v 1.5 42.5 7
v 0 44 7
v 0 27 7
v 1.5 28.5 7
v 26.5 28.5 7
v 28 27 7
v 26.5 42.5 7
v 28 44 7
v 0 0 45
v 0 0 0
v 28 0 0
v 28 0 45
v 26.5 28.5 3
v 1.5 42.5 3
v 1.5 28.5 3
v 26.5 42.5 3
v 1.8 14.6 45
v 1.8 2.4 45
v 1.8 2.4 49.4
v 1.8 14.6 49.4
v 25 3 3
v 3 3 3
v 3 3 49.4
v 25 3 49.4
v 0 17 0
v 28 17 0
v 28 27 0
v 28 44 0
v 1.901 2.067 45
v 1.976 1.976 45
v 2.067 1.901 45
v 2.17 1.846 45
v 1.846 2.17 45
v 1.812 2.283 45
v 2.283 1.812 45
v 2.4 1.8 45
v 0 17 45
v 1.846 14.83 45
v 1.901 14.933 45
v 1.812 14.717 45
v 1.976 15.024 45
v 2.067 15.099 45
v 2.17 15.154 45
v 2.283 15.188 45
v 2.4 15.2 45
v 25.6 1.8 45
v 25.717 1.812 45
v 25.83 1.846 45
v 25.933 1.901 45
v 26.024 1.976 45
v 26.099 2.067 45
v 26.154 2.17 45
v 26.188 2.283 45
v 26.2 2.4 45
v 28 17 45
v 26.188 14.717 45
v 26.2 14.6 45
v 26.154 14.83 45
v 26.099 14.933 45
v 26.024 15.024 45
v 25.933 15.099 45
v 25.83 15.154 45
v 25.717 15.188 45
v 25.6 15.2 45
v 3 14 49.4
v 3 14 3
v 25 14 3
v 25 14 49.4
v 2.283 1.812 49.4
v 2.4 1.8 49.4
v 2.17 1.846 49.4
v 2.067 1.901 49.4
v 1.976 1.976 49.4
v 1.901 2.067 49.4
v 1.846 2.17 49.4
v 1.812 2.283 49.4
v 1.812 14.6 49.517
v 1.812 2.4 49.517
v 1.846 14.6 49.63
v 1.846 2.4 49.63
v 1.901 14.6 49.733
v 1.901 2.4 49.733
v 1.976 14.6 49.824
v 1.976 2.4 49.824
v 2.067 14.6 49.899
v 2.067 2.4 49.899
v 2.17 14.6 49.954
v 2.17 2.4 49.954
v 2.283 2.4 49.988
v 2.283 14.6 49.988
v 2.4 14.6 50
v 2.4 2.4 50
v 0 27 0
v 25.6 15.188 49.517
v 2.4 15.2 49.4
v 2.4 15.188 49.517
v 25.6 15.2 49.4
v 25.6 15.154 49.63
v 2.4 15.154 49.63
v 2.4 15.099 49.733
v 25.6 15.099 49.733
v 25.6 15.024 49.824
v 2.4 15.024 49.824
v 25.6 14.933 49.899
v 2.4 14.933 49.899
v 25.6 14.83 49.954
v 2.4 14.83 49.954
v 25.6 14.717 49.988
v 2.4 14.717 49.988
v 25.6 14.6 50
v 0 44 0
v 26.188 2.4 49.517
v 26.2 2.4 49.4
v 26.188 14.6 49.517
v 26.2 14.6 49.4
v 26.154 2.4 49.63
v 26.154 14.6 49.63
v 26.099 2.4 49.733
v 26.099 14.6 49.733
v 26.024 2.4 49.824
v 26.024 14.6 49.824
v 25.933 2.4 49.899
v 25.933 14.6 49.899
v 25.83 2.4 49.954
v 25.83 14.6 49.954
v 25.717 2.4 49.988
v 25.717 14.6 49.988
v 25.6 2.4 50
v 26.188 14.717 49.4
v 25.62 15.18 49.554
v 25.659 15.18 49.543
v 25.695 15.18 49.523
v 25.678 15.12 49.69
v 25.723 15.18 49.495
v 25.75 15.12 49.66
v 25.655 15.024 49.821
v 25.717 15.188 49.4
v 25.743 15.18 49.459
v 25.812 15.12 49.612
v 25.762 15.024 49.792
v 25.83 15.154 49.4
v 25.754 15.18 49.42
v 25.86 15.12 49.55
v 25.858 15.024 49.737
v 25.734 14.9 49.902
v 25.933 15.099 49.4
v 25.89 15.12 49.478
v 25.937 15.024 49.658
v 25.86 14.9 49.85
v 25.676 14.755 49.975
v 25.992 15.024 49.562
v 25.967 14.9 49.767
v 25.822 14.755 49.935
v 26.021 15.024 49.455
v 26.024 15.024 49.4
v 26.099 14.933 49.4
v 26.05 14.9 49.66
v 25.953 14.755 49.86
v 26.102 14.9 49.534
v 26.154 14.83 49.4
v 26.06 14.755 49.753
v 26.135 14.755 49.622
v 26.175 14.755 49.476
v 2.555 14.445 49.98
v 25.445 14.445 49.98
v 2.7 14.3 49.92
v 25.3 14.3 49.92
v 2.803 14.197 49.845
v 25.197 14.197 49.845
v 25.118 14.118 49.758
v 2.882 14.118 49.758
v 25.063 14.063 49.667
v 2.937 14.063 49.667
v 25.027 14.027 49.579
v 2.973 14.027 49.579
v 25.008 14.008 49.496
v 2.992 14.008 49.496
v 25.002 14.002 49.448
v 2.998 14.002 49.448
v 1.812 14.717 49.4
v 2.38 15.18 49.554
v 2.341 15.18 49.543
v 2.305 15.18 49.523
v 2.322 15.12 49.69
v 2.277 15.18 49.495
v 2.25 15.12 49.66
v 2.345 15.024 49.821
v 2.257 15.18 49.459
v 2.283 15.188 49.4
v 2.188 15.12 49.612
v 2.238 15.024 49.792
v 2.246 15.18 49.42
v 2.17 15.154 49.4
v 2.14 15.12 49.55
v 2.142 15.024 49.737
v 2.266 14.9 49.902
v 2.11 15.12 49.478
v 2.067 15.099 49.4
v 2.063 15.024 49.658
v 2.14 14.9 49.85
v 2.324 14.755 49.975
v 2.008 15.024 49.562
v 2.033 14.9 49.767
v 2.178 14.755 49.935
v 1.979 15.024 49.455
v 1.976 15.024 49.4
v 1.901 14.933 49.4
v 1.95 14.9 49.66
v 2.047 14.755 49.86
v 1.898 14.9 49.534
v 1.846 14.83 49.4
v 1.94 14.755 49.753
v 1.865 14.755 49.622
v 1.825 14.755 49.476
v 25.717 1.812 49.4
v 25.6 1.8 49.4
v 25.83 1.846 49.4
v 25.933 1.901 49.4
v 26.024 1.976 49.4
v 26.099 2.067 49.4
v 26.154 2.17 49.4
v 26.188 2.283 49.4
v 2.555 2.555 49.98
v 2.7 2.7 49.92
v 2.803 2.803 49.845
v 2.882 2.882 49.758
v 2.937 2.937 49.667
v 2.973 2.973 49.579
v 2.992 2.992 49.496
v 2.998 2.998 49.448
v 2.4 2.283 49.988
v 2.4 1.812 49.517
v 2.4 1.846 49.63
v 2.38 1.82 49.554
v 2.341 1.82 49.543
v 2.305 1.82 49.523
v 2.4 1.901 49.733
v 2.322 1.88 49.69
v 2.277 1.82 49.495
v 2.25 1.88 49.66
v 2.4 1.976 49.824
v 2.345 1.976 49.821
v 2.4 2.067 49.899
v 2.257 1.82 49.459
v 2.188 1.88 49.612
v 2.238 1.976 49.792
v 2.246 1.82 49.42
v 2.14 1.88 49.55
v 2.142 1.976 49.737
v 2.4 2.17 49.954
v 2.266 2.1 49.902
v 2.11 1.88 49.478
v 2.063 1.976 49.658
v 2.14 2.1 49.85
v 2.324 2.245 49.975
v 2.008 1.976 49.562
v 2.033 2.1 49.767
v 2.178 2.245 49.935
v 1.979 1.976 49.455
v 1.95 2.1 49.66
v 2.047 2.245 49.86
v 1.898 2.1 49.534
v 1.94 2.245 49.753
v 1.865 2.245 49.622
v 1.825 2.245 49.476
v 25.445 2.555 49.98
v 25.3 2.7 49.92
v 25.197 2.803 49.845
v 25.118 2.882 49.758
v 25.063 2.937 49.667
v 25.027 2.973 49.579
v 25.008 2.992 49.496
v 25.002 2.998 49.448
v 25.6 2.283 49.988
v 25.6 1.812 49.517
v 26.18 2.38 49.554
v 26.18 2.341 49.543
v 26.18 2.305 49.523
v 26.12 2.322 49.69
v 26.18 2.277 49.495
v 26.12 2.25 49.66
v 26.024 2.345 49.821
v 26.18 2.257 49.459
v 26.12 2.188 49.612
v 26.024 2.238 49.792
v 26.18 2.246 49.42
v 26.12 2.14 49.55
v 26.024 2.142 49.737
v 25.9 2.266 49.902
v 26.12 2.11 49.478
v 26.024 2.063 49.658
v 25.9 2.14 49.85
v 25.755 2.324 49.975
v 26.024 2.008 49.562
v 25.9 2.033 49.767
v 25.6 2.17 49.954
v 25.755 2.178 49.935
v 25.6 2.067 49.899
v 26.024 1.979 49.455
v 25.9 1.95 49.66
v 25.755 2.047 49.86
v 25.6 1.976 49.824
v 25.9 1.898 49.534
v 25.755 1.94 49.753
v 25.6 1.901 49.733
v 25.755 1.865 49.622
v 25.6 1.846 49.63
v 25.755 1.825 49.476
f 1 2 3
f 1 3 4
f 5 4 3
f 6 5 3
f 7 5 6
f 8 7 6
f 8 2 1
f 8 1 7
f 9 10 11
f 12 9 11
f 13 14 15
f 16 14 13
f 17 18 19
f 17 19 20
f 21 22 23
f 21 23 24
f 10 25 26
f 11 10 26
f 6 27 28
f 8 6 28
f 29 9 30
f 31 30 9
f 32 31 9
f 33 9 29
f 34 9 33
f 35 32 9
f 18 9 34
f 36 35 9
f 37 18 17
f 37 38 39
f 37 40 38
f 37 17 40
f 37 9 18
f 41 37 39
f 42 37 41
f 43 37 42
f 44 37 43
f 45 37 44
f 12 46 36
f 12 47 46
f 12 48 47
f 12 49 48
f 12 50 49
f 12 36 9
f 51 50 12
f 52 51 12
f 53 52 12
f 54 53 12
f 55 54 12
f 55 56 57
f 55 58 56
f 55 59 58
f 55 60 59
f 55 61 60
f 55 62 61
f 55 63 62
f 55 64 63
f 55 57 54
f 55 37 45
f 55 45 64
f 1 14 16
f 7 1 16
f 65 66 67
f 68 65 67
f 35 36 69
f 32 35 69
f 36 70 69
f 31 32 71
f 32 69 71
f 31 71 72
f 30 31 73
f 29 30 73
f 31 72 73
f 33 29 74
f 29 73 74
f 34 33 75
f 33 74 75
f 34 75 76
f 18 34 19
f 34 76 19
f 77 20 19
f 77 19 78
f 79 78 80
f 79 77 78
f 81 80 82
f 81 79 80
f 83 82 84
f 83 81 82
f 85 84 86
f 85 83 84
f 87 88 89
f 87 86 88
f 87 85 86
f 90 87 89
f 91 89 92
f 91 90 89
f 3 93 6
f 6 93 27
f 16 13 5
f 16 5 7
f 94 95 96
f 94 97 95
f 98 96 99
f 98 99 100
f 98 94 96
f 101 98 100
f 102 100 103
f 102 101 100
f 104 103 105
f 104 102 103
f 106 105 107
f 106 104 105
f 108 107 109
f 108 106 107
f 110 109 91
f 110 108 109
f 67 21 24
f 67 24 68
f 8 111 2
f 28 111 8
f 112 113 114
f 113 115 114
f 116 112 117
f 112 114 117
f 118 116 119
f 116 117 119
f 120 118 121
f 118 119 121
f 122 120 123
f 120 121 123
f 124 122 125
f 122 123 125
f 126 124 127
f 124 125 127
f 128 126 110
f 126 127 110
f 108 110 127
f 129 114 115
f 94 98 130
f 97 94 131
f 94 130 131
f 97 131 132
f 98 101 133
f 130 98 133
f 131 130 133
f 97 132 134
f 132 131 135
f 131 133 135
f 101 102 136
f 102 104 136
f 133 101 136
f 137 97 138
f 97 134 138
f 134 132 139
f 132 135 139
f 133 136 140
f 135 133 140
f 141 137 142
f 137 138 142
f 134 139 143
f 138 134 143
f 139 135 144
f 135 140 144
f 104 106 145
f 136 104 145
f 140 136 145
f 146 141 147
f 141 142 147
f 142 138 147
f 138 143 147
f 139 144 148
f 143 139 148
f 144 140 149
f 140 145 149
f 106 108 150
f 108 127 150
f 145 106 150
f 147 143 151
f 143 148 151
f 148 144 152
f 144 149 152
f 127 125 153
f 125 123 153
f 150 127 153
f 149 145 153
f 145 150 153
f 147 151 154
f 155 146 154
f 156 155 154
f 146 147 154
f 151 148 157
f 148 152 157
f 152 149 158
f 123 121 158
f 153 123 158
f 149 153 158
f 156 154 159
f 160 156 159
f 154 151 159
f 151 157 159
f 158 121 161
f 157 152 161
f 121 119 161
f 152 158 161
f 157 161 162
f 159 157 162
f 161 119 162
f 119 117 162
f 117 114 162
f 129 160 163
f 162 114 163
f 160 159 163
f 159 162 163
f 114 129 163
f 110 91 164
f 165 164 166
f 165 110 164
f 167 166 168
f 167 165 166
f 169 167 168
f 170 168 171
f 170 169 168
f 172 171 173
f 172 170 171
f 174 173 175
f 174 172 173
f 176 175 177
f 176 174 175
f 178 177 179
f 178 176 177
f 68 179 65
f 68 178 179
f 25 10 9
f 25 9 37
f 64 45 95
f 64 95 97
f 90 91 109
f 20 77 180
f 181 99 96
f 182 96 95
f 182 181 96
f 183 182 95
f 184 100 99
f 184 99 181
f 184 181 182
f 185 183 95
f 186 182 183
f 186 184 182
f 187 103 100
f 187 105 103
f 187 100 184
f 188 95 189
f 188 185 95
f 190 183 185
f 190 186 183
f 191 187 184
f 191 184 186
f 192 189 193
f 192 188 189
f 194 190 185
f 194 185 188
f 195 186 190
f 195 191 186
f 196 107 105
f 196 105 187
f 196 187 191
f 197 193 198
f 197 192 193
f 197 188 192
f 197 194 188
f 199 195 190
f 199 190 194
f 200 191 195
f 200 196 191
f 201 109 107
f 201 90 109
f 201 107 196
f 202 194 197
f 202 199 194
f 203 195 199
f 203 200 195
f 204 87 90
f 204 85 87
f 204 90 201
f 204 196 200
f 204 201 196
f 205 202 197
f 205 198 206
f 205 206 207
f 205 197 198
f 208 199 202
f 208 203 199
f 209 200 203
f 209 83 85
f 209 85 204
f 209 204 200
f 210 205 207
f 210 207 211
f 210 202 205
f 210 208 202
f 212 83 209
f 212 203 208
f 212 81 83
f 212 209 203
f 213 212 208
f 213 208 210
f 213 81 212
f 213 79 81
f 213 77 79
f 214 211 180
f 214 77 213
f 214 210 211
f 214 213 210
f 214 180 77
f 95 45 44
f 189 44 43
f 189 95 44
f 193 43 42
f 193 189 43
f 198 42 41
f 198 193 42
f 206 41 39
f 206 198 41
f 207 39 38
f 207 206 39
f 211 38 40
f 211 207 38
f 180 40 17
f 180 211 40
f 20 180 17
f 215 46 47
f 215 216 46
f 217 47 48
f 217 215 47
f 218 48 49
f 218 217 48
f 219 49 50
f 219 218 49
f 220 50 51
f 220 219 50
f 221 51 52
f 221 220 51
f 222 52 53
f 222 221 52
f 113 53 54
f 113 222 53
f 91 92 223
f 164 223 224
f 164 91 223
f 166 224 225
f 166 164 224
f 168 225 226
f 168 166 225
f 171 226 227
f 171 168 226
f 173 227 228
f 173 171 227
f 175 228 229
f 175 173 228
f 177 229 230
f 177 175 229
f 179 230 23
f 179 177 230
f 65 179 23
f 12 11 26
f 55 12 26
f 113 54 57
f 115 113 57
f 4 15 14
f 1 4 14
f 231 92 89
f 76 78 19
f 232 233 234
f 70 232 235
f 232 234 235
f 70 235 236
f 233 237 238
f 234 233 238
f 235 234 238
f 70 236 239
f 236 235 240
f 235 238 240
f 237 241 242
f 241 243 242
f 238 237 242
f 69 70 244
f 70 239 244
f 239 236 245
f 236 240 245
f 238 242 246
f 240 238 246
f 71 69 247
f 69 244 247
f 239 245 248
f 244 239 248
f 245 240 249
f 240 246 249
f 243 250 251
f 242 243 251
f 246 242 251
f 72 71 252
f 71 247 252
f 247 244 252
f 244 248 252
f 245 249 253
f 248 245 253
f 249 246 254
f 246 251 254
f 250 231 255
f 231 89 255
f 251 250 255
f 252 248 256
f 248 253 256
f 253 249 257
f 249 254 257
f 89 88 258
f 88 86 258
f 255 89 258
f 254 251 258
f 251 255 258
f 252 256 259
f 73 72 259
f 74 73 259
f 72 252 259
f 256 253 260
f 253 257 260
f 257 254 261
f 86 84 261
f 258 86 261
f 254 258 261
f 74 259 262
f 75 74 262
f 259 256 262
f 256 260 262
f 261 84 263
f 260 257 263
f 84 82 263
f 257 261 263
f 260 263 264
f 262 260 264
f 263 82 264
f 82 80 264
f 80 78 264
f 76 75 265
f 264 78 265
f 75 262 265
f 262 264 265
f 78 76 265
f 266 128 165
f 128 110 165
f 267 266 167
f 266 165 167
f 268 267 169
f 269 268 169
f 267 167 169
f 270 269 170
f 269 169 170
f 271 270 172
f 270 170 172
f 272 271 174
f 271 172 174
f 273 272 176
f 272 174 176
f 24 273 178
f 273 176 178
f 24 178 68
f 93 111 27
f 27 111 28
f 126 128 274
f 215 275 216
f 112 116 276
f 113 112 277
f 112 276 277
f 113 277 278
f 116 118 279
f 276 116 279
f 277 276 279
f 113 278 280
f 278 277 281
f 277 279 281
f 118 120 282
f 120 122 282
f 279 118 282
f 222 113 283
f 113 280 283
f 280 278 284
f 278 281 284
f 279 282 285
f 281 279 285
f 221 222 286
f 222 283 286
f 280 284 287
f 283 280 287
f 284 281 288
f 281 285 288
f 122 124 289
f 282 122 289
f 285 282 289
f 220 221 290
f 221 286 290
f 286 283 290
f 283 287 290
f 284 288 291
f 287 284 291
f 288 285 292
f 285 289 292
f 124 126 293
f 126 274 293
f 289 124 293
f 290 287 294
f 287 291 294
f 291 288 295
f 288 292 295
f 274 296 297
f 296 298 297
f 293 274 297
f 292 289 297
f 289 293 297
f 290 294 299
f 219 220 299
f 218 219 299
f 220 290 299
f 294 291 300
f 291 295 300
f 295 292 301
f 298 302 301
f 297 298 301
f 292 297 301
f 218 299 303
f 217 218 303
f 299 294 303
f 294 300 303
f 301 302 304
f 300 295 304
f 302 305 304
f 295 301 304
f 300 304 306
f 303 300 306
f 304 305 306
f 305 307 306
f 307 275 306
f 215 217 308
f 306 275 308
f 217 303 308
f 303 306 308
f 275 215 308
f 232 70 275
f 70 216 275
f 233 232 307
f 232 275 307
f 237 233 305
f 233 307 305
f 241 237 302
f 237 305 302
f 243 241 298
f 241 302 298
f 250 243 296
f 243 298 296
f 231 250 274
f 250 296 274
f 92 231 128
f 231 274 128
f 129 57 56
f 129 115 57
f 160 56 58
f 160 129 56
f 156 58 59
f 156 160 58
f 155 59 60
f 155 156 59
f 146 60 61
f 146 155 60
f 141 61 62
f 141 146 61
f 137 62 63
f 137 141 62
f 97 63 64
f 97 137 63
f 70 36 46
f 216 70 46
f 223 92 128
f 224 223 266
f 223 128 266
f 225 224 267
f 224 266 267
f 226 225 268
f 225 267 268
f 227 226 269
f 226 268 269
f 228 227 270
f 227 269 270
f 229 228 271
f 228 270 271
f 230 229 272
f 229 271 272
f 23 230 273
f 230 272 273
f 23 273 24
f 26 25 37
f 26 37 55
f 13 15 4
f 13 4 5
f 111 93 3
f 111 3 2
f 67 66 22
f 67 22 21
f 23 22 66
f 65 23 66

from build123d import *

# Parameters (mm, degrees)
F0_W     = 22
F0_H     = 11
F1_DEPTH = 3
F0_W_2   = 25
F0_H_2   = 14
F0_W_3   = 24.4
F0_H_3   = 13.4
F2_DEPTH = 50
F0_W_4   = 28
F0_H_4   = 17
F3_DEPTH = 45
F4_DEPTH = 7
F5_R     = 0.59999


# Not quite as in the source:
# - a fillet or chamfer is up to 0.001 mm smaller than in the source, because OpenCascade refuses the exact size


with BuildPart() as f1:
    # F0 (on Top) → F1 (new body)
    with BuildSketch(Plane.XY):
        with Locations((14, 8.5)):
            Rectangle(F0_W, F0_H)
    extrude(amount=F1_DEPTH)

    # F0 (on Top) → F2 (join)
    with BuildSketch(Plane.XY):
        with Locations((14, 8.5)):
            Rectangle(F0_W_3, F0_H_3)
        with Locations((14, 8.5)):
            Rectangle(F0_W, F0_H, mode=Mode.SUBTRACT)
    extrude(amount=F2_DEPTH)

    # F0 (on Top) → F3 (join)
    with BuildSketch(Plane.XY):
        with Locations((14, 8.5)):
            Rectangle(F0_W_4, F0_H_4)
        with Locations((14, 8.5)):
            Rectangle(F0_W_3, F0_H_3, mode=Mode.SUBTRACT)
    extrude(amount=F3_DEPTH)

    # F5 (radius 0.6 in the source; OpenCascade refuses exactly that, so slightly less here)
    f5_edges = [f1.edges().sort_by_distance(p)[0] for p in [
        (1.8, 8.5, 50),
        (14, 1.8, 50),
        (26.2, 8.5, 50),
        (14, 15.2, 50),
        (14, 3, 50),
        (3, 8.5, 50),
        (14, 14, 50),
        (25, 8.5, 50),
        (26.2, 1.8, 47.5),
        (26.2, 15.2, 47.5),
        (1.8, 15.2, 47.5),
        (1.8, 1.8, 47.5),
    ]]
    fillet(f5_edges, radius=F5_R)


with BuildPart() as f1b:
    # F0 (on Top) → F1, piece 2 (new body)
    with BuildSketch(Plane.XY):
        with Locations((14, 35.5)):
            Rectangle(F0_W_2, F0_H_2)
    extrude(amount=F1_DEPTH)

    # F0 (on Top) → F4 (join)
    with BuildSketch(Plane.XY):
        with Locations((14, 35.5)):
            Rectangle(F0_W_4, F0_H_4)
        with Locations((14, 35.5)):
            Rectangle(F0_W_2, F0_H_2, mode=Mode.SUBTRACT)
    extrude(amount=F4_DEPTH)


solid = Compound([f1.part, f1b.part])
